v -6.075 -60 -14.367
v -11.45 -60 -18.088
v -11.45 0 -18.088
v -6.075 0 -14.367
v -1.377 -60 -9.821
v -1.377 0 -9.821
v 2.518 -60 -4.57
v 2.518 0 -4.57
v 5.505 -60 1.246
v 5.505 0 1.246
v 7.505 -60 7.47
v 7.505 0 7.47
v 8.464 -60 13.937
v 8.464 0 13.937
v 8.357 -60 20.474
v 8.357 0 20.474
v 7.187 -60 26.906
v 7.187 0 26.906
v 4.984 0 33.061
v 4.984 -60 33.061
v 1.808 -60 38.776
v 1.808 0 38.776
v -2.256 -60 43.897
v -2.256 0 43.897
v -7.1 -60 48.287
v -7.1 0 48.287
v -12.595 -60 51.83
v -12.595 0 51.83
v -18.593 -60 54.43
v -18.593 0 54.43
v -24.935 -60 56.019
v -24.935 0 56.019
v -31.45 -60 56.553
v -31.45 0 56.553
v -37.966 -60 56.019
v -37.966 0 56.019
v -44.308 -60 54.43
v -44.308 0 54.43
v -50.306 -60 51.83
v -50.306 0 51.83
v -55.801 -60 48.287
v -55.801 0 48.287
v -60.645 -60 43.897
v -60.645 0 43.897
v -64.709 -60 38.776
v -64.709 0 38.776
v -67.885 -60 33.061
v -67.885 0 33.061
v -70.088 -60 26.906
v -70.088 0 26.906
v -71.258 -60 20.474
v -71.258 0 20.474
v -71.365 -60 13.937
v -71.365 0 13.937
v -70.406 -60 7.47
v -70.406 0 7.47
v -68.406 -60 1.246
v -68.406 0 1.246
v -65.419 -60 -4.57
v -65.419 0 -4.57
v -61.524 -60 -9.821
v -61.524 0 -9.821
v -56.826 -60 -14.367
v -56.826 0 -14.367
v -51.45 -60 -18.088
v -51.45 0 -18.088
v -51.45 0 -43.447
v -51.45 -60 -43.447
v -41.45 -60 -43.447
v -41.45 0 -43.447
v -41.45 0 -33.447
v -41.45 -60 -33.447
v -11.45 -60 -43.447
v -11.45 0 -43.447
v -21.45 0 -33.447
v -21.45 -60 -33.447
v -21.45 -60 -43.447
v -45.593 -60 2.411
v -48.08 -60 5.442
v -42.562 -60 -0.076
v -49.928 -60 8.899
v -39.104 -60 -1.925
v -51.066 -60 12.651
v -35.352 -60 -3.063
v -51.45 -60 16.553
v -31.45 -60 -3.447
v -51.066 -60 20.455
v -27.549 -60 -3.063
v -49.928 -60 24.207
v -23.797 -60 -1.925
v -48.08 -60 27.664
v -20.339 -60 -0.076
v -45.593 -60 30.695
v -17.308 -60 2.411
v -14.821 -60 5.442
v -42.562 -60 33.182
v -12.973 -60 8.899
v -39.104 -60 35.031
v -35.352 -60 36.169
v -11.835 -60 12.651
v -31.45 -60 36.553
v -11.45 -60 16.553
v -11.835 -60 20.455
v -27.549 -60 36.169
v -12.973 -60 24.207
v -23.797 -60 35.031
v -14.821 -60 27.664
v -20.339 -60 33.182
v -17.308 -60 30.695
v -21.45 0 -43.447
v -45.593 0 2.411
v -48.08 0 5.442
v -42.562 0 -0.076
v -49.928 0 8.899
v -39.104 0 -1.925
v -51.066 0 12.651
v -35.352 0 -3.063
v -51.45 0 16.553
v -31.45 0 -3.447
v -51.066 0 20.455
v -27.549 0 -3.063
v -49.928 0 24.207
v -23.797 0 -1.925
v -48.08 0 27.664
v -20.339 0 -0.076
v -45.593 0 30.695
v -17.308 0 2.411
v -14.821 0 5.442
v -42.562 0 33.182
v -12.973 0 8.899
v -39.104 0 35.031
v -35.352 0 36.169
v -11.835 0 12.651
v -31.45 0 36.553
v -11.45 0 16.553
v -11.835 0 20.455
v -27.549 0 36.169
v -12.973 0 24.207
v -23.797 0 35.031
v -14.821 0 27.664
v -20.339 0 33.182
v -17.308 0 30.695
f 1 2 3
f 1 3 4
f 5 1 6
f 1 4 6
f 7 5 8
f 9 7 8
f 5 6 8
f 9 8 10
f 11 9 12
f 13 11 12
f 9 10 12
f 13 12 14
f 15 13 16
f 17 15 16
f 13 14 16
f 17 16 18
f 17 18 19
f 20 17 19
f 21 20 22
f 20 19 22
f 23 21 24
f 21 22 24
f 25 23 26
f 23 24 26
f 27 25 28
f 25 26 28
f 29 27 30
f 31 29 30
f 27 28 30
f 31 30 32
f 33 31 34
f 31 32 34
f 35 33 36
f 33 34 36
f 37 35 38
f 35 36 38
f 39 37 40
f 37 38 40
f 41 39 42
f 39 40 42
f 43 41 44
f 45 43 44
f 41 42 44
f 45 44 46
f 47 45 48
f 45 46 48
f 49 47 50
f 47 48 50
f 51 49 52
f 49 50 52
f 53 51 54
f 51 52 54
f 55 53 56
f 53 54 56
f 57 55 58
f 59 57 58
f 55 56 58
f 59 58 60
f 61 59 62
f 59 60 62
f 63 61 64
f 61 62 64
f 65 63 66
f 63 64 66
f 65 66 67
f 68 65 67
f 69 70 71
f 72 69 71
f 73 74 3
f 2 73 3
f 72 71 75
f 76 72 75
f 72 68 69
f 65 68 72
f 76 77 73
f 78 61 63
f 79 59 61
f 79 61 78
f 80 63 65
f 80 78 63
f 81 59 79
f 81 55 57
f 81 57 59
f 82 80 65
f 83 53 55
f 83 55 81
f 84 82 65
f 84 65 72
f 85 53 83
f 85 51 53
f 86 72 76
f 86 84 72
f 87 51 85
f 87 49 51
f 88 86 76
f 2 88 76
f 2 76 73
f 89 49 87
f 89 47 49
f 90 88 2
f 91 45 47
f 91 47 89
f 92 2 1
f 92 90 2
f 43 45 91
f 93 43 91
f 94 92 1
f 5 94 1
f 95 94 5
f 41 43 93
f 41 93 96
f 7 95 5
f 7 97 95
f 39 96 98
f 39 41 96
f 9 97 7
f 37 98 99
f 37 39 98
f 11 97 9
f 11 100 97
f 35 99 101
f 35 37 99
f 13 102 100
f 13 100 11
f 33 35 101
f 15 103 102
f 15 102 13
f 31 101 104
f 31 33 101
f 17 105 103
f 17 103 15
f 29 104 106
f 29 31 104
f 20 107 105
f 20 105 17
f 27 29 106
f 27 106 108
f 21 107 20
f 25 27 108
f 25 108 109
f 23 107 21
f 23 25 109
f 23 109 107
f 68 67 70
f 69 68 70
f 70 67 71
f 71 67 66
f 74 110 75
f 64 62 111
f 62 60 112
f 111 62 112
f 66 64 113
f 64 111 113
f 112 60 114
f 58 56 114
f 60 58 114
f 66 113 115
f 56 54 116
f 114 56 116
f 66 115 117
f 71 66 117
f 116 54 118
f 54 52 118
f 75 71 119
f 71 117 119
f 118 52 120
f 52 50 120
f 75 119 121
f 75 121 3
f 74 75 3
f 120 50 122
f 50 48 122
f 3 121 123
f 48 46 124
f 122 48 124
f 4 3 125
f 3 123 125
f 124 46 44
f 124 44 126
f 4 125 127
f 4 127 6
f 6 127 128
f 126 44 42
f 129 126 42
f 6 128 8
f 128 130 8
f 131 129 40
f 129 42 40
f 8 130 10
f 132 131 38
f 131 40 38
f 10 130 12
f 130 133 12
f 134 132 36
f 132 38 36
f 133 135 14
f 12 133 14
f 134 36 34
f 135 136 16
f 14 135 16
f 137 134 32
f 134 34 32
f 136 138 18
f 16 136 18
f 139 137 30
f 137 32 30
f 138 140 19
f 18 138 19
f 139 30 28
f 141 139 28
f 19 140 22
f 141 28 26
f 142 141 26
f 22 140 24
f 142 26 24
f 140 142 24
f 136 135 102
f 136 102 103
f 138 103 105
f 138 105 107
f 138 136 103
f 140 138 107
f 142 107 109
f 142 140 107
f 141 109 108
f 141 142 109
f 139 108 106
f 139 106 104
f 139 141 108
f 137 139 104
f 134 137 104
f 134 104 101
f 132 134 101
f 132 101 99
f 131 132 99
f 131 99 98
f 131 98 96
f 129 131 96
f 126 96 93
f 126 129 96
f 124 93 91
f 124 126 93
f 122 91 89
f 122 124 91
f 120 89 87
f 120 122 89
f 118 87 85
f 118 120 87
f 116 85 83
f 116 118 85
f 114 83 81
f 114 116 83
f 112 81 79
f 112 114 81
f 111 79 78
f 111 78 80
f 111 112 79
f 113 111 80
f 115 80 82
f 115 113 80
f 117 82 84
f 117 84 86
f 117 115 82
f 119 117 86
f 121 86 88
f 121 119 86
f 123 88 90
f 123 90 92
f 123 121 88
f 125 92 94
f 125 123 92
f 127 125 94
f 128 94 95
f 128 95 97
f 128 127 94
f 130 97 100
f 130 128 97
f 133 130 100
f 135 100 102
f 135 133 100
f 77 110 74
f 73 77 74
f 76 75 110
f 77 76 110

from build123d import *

# Parameters (mm, degrees)
F0_R     = 20
F1_DEPTH = 60


with BuildPart() as f1:
    # F0 (on Front) → F1 (new body)
    with BuildSketch(Plane.XZ):
        with BuildLine():
            Line((-51.450498, -23.447088), (-51.450498, -43.447088))
            Line((-51.450498, -43.447088), (-41.450498, -43.447088))
            Line((-41.450498, -43.447088), (-41.450498, -33.447088))
            Line((-41.450498, -33.447088), (-21.450498, -33.447088))
            Line((-21.450498, -33.447088), (-21.450498, -43.447088))
            Line((-21.450498, -43.447088), (-11.450498, -43.447088))
            Line((-11.450498, -43.447088), (-11.450498, -23.447088))
            Line((-11.450498, -23.447088), (-11.450498, -18.088088))
            ThreePointArc((-11.450498, -18.088088), (-31.450498, 56.552928), (-51.450498, -18.088088))
            Line((-51.450498, -18.088088), (-51.450498, -23.447088))
        make_face()
        with Locations((-31.450498, 16.552928)):
            Circle(F0_R, mode=Mode.SUBTRACT)
    extrude(amount=F1_DEPTH)


solid = f1.part
